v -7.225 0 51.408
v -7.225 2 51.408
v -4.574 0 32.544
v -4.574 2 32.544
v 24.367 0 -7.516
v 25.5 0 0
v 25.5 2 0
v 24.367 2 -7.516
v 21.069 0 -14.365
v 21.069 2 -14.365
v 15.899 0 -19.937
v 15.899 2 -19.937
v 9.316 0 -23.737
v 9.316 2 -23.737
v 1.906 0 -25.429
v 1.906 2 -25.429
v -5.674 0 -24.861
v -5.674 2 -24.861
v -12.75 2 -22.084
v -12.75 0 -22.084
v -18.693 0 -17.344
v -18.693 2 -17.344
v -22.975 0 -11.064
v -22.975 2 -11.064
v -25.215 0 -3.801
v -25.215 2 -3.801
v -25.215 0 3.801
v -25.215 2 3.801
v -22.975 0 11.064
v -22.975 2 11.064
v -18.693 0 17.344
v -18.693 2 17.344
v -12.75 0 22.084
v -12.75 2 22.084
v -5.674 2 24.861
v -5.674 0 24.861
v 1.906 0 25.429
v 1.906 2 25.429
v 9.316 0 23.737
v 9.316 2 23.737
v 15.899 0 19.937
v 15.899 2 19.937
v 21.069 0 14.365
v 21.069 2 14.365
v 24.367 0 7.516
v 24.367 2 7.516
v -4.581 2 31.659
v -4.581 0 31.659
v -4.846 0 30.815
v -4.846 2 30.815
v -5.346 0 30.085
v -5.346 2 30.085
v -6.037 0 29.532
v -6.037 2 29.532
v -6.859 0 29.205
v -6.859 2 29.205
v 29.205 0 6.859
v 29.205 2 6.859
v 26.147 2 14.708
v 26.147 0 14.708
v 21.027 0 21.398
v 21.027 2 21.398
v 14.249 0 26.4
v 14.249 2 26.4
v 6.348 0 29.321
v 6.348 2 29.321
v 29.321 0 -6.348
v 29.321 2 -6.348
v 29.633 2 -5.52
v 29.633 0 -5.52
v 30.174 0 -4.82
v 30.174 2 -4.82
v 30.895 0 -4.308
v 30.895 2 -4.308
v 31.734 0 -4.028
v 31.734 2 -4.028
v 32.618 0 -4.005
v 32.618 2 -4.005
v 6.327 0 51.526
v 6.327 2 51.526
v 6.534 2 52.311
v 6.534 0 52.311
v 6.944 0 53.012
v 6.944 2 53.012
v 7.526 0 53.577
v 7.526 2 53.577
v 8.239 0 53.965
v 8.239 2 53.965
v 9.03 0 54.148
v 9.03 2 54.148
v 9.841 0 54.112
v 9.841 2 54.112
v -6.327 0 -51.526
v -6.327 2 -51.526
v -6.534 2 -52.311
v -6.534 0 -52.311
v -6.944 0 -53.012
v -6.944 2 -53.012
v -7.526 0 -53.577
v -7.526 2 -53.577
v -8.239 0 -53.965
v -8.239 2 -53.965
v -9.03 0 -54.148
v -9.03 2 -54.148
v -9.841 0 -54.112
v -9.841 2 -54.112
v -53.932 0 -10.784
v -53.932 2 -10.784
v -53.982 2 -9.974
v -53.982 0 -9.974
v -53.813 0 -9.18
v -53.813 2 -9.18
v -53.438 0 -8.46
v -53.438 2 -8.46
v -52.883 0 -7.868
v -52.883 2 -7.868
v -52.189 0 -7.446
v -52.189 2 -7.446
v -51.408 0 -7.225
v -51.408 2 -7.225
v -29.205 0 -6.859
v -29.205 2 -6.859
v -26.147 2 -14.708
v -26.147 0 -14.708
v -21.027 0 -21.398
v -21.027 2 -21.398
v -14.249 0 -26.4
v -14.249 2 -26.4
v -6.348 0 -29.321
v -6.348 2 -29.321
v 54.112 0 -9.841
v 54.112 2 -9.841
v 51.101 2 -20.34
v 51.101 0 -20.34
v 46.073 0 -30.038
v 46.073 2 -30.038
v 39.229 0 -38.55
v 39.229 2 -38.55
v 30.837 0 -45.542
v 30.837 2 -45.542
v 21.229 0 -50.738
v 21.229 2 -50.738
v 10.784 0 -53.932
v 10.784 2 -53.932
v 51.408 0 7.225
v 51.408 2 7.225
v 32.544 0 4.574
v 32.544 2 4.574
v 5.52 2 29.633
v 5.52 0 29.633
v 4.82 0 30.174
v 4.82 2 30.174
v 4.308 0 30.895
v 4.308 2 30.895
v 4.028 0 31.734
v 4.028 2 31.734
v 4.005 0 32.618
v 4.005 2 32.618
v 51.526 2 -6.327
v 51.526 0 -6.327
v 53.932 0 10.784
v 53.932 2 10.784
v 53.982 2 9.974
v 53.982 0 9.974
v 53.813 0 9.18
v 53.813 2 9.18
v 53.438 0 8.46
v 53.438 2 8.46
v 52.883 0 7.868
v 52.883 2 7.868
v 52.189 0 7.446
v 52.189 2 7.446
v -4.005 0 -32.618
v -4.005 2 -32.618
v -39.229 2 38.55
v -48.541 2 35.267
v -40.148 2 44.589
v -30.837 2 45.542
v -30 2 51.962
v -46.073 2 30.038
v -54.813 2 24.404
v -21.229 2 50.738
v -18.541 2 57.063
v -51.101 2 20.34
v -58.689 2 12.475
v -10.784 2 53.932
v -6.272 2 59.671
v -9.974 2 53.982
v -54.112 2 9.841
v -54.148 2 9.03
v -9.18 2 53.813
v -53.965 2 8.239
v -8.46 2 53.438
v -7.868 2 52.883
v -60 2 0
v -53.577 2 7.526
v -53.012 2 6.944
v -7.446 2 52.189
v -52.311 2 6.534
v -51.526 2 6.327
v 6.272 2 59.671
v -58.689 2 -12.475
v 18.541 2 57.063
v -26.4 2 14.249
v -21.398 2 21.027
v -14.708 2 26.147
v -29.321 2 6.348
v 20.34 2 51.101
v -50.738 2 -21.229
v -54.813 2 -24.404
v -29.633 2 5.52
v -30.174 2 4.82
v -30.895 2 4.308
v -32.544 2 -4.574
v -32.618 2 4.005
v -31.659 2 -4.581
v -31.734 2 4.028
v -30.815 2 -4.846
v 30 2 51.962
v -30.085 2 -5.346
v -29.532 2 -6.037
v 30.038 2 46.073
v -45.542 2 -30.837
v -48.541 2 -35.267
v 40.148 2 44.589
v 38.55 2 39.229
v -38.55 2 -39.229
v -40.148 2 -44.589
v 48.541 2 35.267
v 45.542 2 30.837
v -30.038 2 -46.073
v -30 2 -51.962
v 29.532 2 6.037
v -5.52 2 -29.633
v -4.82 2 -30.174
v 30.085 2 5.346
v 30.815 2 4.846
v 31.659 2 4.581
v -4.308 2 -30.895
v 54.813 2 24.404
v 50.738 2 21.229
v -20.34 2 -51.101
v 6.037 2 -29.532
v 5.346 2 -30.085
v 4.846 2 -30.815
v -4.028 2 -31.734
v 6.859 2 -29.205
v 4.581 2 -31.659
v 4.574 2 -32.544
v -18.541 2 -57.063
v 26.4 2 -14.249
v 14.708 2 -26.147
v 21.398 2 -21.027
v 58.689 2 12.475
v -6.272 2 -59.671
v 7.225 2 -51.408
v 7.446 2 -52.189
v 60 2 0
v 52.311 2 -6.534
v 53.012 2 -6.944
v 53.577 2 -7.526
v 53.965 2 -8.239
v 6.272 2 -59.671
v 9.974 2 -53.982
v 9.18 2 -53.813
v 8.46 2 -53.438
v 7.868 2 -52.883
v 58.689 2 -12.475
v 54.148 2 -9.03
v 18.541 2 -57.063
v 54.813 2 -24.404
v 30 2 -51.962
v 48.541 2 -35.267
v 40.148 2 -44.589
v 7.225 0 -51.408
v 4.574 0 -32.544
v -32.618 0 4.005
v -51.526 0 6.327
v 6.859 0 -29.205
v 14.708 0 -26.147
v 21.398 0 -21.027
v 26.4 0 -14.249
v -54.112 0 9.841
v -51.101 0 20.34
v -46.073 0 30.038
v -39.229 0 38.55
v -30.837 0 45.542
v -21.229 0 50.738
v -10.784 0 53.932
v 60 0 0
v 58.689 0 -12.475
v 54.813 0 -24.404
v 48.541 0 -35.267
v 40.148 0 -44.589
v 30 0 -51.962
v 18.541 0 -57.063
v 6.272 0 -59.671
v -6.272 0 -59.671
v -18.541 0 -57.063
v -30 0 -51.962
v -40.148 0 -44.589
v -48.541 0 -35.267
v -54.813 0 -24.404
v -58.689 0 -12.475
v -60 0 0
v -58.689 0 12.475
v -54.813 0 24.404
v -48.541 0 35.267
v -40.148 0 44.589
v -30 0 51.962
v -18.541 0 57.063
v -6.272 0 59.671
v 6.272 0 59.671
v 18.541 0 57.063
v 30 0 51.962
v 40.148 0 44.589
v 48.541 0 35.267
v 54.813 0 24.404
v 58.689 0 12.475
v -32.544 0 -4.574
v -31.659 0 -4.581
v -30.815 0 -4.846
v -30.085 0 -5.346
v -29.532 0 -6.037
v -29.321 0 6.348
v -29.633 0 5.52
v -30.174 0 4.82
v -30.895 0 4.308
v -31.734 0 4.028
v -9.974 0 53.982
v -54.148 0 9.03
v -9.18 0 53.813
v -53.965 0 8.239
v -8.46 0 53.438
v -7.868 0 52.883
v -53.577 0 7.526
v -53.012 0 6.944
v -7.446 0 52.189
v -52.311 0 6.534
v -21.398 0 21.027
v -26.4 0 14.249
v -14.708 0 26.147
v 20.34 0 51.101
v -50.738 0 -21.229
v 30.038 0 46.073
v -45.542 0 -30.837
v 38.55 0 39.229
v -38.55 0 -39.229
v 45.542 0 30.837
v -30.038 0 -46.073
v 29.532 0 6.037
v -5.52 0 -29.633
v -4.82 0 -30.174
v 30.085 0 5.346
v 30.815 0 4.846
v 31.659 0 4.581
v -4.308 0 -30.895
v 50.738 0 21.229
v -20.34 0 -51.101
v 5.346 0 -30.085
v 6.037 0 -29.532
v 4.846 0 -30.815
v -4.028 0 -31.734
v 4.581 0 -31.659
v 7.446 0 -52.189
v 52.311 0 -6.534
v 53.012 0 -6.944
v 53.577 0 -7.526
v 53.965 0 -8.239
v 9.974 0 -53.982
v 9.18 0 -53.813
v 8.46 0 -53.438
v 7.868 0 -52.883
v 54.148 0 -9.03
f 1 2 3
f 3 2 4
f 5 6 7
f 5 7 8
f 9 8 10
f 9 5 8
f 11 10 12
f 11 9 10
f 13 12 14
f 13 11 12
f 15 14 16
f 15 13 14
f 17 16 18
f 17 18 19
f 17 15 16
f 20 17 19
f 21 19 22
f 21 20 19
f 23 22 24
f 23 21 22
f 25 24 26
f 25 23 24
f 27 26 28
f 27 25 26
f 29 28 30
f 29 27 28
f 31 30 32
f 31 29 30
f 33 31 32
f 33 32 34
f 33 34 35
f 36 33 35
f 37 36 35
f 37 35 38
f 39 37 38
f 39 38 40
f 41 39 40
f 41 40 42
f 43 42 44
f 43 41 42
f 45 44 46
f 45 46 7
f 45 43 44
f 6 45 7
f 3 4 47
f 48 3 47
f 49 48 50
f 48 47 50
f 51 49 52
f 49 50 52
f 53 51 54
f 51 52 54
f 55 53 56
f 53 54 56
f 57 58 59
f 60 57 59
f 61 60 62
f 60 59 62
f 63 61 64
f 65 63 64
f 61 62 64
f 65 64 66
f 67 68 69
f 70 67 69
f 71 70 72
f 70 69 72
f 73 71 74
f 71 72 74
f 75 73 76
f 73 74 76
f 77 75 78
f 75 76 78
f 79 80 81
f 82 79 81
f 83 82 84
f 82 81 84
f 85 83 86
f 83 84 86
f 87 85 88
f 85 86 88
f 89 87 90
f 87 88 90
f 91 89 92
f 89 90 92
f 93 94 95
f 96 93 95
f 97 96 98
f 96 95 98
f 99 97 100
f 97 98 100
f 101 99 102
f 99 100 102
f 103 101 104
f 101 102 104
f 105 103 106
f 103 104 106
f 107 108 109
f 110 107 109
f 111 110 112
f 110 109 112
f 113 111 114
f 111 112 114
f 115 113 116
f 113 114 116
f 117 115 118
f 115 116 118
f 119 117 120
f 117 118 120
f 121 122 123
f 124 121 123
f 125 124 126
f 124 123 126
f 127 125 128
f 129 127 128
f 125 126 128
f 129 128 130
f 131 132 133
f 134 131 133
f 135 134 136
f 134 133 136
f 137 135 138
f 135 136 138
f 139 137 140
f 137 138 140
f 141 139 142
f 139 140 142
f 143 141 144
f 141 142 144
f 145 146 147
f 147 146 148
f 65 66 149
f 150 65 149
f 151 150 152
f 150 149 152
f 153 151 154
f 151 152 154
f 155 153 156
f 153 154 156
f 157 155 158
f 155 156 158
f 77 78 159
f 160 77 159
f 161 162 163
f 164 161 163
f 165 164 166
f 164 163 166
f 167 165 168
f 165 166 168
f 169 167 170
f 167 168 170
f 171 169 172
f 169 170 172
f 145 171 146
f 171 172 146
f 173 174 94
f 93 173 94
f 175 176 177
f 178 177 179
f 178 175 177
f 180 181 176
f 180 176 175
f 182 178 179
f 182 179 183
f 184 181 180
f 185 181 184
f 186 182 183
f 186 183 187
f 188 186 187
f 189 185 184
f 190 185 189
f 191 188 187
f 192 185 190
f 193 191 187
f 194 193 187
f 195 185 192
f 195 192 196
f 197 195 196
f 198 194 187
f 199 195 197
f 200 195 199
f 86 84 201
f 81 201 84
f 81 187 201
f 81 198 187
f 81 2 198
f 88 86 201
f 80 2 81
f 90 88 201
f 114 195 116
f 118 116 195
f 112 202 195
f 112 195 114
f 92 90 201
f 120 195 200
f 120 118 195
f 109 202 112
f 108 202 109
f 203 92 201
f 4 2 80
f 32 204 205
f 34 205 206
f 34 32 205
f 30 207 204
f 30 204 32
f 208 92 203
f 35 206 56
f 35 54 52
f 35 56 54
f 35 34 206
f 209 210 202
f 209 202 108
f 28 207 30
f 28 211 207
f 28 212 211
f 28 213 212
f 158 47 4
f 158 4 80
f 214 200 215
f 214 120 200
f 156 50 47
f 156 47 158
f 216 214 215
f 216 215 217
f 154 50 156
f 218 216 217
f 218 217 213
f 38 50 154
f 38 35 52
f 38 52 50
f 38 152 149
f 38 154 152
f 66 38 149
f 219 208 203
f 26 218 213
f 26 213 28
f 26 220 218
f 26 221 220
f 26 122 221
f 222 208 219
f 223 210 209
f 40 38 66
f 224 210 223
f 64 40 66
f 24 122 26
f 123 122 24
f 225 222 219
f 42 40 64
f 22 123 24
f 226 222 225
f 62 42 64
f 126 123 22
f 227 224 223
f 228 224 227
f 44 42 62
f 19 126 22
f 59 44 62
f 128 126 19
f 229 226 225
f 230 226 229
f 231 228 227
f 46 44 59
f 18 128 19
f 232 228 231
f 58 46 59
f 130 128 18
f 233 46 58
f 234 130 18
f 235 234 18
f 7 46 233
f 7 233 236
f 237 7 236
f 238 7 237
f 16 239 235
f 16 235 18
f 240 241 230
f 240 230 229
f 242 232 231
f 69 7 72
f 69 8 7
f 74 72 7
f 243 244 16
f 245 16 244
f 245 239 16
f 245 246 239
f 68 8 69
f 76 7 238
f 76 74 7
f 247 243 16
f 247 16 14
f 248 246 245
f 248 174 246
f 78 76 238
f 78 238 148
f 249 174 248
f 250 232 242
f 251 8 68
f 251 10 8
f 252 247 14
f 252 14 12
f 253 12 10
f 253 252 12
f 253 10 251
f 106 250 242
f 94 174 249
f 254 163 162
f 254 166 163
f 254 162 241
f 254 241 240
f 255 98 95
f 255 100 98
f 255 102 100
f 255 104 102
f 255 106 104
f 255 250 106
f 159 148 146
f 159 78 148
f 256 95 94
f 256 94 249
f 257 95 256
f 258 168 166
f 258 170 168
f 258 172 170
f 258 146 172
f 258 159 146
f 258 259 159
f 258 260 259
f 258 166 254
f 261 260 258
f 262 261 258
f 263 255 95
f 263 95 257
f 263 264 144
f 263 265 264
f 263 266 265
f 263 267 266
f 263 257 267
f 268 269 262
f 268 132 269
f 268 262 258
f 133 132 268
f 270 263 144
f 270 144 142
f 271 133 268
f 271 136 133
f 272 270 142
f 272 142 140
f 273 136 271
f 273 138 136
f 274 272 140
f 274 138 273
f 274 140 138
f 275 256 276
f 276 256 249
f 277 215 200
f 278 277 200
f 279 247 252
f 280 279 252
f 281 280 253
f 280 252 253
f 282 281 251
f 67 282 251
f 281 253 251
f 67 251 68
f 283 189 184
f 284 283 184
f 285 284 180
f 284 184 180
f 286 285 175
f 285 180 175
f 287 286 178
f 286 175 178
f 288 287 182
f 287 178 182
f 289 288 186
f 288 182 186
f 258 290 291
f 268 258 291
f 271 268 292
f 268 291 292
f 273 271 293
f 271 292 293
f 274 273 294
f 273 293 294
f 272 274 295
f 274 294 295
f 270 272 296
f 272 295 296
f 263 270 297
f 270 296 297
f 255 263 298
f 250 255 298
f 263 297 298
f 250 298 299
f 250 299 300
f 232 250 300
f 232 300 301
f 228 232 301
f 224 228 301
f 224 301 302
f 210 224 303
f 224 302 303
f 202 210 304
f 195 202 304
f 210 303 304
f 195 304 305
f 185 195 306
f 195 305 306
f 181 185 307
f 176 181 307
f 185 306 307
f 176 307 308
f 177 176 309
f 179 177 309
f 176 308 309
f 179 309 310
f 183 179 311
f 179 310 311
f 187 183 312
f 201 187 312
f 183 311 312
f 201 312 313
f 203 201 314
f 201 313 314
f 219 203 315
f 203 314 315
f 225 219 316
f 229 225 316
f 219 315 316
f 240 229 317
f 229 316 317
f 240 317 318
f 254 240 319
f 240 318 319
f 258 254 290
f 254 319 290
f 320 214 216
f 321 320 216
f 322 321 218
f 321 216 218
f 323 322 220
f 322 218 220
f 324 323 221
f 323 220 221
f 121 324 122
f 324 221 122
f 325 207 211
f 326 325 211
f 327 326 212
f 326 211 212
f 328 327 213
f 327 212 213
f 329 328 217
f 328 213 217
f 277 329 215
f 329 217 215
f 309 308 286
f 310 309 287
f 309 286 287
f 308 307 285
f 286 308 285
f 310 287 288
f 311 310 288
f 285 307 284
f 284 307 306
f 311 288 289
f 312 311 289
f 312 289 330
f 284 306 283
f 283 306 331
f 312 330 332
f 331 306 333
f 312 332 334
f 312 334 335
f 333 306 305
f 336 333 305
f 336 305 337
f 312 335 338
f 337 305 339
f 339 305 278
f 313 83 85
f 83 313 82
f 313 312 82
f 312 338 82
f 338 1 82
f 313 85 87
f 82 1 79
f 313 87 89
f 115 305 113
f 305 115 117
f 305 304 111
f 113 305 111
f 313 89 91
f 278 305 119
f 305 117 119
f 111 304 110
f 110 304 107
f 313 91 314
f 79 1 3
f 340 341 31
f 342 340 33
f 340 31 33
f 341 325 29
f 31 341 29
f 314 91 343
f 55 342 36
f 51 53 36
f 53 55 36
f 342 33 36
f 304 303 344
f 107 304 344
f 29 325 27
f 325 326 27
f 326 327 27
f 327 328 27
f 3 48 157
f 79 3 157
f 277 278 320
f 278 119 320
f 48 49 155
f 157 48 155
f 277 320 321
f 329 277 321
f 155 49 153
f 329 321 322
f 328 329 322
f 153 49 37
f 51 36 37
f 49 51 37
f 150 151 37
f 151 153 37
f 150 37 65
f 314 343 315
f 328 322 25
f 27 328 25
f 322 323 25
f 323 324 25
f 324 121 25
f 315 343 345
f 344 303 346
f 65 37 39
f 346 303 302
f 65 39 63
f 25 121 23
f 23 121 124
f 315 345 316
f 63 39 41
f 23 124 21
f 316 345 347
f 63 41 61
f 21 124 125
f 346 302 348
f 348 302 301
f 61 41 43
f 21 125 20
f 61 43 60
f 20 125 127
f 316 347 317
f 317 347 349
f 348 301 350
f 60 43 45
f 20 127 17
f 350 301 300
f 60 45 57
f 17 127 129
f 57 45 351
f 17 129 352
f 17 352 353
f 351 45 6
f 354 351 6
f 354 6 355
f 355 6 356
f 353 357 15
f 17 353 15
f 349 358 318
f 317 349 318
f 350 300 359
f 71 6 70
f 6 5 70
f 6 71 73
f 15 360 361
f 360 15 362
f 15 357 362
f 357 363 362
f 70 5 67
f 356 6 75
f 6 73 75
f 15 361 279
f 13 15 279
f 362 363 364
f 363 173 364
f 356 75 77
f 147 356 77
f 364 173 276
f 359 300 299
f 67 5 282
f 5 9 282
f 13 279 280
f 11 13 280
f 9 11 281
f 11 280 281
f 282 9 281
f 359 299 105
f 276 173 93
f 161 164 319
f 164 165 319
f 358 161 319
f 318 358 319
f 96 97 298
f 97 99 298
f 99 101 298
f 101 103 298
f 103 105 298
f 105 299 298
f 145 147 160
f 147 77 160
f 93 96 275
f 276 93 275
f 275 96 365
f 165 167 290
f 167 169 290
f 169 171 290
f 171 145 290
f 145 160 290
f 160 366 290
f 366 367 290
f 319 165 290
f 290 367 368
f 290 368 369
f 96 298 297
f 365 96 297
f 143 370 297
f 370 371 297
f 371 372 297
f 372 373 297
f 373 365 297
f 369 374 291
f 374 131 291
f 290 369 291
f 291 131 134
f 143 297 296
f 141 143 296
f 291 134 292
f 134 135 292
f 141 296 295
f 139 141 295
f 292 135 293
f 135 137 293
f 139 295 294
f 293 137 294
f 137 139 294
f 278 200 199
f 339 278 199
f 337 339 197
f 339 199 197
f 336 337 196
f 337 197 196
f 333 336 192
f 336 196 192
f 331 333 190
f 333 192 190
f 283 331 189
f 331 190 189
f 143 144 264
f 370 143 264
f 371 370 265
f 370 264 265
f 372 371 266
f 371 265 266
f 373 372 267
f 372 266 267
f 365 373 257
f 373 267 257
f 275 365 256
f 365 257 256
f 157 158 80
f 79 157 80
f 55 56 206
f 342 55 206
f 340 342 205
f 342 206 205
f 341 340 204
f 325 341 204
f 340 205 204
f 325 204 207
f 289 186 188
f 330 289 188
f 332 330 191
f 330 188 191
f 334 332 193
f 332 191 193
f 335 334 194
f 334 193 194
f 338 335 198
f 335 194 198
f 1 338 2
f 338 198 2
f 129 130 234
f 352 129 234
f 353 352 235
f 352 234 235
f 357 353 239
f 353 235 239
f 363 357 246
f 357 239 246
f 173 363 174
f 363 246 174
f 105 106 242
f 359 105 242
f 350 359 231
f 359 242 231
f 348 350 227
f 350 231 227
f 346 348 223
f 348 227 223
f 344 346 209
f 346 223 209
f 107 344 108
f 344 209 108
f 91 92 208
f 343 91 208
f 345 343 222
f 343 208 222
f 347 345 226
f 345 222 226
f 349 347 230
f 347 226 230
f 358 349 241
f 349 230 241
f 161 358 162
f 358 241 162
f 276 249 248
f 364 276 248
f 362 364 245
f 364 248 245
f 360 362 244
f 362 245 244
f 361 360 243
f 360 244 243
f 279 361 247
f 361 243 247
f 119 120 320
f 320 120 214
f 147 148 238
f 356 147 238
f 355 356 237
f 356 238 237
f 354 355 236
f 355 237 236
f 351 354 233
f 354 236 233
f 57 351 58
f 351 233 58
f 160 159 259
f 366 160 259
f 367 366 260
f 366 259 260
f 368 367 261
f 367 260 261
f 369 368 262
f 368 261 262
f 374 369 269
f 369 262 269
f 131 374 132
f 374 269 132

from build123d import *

# Parameters (mm, degrees)
SKETCH1_R           = 60
SKETCH1_R_2         = 25.5
BOSS_EXTRUDE1_DEPTH = 2
CUT_EXTRUDE1_DEPTH  = 2
CIRPATTERN1_COUNT   = 4


with BuildPart() as part:
    # Sketch1 → Boss-Extrude1 (new body)
    with BuildSketch(Plane(origin=(0, 0, 0), x_dir=(1, 0, 0), z_dir=(0, 1, 0))):
        Circle(SKETCH1_R)
        Circle(SKETCH1_R_2, mode=Mode.SUBTRACT)
    extrude(amount=BOSS_EXTRUDE1_DEPTH)

    # Sketch2 → Cut-Extrude1 (cut)
    with BuildSketch(Plane(origin=(0, 2, 0), x_dir=(1, 0, 0), z_dir=(0, 1, 0))):
        with BuildLine():
            Line((-32.618394997, -4.005035307), (-51.526434877, -6.326650681))
            ThreePointArc((-51.526434877, -6.326650681), (-53.577175122, -7.526295601), (-54.112413011, -9.841075048))
            ThreePointArc((-54.112413011, -9.841075048), (-39.228774703, -38.550009536), (-10.78396803, -53.932420987))
            ThreePointArc((-10.78396803, -53.932420987), (-8.460199946, -53.437663089), (-7.224947385, -51.408171873))
            Line((-7.224947385, -51.408171873), (-4.573694808, -32.543529554))
            ThreePointArc((-4.573694808, -32.543529554), (-5.068923242, -30.431452905), (-6.858635467, -29.205463864))
            ThreePointArc((-6.858635467, -29.205463864), (-21.397513475, -21.027277929), (-29.320715424, -6.347885238))
            ThreePointArc((-29.320715424, -6.347885238), (-30.515282955, -4.537049136), (-32.618394997, -4.005035307))
        make_face()
    cut_extrude1 = extrude(amount=-CUT_EXTRUDE1_DEPTH, mode=Mode.SUBTRACT)

    # CirPattern1: Cut-Extrude1 ×4 about axis
    cirpattern1_axis = Axis((0, 0, 0), (0, 1, 0))
    for i in range(1, CIRPATTERN1_COUNT):
        add(cut_extrude1.rotate(cirpattern1_axis, i * 360 / CIRPATTERN1_COUNT), mode=Mode.SUBTRACT)


solid = part.part
